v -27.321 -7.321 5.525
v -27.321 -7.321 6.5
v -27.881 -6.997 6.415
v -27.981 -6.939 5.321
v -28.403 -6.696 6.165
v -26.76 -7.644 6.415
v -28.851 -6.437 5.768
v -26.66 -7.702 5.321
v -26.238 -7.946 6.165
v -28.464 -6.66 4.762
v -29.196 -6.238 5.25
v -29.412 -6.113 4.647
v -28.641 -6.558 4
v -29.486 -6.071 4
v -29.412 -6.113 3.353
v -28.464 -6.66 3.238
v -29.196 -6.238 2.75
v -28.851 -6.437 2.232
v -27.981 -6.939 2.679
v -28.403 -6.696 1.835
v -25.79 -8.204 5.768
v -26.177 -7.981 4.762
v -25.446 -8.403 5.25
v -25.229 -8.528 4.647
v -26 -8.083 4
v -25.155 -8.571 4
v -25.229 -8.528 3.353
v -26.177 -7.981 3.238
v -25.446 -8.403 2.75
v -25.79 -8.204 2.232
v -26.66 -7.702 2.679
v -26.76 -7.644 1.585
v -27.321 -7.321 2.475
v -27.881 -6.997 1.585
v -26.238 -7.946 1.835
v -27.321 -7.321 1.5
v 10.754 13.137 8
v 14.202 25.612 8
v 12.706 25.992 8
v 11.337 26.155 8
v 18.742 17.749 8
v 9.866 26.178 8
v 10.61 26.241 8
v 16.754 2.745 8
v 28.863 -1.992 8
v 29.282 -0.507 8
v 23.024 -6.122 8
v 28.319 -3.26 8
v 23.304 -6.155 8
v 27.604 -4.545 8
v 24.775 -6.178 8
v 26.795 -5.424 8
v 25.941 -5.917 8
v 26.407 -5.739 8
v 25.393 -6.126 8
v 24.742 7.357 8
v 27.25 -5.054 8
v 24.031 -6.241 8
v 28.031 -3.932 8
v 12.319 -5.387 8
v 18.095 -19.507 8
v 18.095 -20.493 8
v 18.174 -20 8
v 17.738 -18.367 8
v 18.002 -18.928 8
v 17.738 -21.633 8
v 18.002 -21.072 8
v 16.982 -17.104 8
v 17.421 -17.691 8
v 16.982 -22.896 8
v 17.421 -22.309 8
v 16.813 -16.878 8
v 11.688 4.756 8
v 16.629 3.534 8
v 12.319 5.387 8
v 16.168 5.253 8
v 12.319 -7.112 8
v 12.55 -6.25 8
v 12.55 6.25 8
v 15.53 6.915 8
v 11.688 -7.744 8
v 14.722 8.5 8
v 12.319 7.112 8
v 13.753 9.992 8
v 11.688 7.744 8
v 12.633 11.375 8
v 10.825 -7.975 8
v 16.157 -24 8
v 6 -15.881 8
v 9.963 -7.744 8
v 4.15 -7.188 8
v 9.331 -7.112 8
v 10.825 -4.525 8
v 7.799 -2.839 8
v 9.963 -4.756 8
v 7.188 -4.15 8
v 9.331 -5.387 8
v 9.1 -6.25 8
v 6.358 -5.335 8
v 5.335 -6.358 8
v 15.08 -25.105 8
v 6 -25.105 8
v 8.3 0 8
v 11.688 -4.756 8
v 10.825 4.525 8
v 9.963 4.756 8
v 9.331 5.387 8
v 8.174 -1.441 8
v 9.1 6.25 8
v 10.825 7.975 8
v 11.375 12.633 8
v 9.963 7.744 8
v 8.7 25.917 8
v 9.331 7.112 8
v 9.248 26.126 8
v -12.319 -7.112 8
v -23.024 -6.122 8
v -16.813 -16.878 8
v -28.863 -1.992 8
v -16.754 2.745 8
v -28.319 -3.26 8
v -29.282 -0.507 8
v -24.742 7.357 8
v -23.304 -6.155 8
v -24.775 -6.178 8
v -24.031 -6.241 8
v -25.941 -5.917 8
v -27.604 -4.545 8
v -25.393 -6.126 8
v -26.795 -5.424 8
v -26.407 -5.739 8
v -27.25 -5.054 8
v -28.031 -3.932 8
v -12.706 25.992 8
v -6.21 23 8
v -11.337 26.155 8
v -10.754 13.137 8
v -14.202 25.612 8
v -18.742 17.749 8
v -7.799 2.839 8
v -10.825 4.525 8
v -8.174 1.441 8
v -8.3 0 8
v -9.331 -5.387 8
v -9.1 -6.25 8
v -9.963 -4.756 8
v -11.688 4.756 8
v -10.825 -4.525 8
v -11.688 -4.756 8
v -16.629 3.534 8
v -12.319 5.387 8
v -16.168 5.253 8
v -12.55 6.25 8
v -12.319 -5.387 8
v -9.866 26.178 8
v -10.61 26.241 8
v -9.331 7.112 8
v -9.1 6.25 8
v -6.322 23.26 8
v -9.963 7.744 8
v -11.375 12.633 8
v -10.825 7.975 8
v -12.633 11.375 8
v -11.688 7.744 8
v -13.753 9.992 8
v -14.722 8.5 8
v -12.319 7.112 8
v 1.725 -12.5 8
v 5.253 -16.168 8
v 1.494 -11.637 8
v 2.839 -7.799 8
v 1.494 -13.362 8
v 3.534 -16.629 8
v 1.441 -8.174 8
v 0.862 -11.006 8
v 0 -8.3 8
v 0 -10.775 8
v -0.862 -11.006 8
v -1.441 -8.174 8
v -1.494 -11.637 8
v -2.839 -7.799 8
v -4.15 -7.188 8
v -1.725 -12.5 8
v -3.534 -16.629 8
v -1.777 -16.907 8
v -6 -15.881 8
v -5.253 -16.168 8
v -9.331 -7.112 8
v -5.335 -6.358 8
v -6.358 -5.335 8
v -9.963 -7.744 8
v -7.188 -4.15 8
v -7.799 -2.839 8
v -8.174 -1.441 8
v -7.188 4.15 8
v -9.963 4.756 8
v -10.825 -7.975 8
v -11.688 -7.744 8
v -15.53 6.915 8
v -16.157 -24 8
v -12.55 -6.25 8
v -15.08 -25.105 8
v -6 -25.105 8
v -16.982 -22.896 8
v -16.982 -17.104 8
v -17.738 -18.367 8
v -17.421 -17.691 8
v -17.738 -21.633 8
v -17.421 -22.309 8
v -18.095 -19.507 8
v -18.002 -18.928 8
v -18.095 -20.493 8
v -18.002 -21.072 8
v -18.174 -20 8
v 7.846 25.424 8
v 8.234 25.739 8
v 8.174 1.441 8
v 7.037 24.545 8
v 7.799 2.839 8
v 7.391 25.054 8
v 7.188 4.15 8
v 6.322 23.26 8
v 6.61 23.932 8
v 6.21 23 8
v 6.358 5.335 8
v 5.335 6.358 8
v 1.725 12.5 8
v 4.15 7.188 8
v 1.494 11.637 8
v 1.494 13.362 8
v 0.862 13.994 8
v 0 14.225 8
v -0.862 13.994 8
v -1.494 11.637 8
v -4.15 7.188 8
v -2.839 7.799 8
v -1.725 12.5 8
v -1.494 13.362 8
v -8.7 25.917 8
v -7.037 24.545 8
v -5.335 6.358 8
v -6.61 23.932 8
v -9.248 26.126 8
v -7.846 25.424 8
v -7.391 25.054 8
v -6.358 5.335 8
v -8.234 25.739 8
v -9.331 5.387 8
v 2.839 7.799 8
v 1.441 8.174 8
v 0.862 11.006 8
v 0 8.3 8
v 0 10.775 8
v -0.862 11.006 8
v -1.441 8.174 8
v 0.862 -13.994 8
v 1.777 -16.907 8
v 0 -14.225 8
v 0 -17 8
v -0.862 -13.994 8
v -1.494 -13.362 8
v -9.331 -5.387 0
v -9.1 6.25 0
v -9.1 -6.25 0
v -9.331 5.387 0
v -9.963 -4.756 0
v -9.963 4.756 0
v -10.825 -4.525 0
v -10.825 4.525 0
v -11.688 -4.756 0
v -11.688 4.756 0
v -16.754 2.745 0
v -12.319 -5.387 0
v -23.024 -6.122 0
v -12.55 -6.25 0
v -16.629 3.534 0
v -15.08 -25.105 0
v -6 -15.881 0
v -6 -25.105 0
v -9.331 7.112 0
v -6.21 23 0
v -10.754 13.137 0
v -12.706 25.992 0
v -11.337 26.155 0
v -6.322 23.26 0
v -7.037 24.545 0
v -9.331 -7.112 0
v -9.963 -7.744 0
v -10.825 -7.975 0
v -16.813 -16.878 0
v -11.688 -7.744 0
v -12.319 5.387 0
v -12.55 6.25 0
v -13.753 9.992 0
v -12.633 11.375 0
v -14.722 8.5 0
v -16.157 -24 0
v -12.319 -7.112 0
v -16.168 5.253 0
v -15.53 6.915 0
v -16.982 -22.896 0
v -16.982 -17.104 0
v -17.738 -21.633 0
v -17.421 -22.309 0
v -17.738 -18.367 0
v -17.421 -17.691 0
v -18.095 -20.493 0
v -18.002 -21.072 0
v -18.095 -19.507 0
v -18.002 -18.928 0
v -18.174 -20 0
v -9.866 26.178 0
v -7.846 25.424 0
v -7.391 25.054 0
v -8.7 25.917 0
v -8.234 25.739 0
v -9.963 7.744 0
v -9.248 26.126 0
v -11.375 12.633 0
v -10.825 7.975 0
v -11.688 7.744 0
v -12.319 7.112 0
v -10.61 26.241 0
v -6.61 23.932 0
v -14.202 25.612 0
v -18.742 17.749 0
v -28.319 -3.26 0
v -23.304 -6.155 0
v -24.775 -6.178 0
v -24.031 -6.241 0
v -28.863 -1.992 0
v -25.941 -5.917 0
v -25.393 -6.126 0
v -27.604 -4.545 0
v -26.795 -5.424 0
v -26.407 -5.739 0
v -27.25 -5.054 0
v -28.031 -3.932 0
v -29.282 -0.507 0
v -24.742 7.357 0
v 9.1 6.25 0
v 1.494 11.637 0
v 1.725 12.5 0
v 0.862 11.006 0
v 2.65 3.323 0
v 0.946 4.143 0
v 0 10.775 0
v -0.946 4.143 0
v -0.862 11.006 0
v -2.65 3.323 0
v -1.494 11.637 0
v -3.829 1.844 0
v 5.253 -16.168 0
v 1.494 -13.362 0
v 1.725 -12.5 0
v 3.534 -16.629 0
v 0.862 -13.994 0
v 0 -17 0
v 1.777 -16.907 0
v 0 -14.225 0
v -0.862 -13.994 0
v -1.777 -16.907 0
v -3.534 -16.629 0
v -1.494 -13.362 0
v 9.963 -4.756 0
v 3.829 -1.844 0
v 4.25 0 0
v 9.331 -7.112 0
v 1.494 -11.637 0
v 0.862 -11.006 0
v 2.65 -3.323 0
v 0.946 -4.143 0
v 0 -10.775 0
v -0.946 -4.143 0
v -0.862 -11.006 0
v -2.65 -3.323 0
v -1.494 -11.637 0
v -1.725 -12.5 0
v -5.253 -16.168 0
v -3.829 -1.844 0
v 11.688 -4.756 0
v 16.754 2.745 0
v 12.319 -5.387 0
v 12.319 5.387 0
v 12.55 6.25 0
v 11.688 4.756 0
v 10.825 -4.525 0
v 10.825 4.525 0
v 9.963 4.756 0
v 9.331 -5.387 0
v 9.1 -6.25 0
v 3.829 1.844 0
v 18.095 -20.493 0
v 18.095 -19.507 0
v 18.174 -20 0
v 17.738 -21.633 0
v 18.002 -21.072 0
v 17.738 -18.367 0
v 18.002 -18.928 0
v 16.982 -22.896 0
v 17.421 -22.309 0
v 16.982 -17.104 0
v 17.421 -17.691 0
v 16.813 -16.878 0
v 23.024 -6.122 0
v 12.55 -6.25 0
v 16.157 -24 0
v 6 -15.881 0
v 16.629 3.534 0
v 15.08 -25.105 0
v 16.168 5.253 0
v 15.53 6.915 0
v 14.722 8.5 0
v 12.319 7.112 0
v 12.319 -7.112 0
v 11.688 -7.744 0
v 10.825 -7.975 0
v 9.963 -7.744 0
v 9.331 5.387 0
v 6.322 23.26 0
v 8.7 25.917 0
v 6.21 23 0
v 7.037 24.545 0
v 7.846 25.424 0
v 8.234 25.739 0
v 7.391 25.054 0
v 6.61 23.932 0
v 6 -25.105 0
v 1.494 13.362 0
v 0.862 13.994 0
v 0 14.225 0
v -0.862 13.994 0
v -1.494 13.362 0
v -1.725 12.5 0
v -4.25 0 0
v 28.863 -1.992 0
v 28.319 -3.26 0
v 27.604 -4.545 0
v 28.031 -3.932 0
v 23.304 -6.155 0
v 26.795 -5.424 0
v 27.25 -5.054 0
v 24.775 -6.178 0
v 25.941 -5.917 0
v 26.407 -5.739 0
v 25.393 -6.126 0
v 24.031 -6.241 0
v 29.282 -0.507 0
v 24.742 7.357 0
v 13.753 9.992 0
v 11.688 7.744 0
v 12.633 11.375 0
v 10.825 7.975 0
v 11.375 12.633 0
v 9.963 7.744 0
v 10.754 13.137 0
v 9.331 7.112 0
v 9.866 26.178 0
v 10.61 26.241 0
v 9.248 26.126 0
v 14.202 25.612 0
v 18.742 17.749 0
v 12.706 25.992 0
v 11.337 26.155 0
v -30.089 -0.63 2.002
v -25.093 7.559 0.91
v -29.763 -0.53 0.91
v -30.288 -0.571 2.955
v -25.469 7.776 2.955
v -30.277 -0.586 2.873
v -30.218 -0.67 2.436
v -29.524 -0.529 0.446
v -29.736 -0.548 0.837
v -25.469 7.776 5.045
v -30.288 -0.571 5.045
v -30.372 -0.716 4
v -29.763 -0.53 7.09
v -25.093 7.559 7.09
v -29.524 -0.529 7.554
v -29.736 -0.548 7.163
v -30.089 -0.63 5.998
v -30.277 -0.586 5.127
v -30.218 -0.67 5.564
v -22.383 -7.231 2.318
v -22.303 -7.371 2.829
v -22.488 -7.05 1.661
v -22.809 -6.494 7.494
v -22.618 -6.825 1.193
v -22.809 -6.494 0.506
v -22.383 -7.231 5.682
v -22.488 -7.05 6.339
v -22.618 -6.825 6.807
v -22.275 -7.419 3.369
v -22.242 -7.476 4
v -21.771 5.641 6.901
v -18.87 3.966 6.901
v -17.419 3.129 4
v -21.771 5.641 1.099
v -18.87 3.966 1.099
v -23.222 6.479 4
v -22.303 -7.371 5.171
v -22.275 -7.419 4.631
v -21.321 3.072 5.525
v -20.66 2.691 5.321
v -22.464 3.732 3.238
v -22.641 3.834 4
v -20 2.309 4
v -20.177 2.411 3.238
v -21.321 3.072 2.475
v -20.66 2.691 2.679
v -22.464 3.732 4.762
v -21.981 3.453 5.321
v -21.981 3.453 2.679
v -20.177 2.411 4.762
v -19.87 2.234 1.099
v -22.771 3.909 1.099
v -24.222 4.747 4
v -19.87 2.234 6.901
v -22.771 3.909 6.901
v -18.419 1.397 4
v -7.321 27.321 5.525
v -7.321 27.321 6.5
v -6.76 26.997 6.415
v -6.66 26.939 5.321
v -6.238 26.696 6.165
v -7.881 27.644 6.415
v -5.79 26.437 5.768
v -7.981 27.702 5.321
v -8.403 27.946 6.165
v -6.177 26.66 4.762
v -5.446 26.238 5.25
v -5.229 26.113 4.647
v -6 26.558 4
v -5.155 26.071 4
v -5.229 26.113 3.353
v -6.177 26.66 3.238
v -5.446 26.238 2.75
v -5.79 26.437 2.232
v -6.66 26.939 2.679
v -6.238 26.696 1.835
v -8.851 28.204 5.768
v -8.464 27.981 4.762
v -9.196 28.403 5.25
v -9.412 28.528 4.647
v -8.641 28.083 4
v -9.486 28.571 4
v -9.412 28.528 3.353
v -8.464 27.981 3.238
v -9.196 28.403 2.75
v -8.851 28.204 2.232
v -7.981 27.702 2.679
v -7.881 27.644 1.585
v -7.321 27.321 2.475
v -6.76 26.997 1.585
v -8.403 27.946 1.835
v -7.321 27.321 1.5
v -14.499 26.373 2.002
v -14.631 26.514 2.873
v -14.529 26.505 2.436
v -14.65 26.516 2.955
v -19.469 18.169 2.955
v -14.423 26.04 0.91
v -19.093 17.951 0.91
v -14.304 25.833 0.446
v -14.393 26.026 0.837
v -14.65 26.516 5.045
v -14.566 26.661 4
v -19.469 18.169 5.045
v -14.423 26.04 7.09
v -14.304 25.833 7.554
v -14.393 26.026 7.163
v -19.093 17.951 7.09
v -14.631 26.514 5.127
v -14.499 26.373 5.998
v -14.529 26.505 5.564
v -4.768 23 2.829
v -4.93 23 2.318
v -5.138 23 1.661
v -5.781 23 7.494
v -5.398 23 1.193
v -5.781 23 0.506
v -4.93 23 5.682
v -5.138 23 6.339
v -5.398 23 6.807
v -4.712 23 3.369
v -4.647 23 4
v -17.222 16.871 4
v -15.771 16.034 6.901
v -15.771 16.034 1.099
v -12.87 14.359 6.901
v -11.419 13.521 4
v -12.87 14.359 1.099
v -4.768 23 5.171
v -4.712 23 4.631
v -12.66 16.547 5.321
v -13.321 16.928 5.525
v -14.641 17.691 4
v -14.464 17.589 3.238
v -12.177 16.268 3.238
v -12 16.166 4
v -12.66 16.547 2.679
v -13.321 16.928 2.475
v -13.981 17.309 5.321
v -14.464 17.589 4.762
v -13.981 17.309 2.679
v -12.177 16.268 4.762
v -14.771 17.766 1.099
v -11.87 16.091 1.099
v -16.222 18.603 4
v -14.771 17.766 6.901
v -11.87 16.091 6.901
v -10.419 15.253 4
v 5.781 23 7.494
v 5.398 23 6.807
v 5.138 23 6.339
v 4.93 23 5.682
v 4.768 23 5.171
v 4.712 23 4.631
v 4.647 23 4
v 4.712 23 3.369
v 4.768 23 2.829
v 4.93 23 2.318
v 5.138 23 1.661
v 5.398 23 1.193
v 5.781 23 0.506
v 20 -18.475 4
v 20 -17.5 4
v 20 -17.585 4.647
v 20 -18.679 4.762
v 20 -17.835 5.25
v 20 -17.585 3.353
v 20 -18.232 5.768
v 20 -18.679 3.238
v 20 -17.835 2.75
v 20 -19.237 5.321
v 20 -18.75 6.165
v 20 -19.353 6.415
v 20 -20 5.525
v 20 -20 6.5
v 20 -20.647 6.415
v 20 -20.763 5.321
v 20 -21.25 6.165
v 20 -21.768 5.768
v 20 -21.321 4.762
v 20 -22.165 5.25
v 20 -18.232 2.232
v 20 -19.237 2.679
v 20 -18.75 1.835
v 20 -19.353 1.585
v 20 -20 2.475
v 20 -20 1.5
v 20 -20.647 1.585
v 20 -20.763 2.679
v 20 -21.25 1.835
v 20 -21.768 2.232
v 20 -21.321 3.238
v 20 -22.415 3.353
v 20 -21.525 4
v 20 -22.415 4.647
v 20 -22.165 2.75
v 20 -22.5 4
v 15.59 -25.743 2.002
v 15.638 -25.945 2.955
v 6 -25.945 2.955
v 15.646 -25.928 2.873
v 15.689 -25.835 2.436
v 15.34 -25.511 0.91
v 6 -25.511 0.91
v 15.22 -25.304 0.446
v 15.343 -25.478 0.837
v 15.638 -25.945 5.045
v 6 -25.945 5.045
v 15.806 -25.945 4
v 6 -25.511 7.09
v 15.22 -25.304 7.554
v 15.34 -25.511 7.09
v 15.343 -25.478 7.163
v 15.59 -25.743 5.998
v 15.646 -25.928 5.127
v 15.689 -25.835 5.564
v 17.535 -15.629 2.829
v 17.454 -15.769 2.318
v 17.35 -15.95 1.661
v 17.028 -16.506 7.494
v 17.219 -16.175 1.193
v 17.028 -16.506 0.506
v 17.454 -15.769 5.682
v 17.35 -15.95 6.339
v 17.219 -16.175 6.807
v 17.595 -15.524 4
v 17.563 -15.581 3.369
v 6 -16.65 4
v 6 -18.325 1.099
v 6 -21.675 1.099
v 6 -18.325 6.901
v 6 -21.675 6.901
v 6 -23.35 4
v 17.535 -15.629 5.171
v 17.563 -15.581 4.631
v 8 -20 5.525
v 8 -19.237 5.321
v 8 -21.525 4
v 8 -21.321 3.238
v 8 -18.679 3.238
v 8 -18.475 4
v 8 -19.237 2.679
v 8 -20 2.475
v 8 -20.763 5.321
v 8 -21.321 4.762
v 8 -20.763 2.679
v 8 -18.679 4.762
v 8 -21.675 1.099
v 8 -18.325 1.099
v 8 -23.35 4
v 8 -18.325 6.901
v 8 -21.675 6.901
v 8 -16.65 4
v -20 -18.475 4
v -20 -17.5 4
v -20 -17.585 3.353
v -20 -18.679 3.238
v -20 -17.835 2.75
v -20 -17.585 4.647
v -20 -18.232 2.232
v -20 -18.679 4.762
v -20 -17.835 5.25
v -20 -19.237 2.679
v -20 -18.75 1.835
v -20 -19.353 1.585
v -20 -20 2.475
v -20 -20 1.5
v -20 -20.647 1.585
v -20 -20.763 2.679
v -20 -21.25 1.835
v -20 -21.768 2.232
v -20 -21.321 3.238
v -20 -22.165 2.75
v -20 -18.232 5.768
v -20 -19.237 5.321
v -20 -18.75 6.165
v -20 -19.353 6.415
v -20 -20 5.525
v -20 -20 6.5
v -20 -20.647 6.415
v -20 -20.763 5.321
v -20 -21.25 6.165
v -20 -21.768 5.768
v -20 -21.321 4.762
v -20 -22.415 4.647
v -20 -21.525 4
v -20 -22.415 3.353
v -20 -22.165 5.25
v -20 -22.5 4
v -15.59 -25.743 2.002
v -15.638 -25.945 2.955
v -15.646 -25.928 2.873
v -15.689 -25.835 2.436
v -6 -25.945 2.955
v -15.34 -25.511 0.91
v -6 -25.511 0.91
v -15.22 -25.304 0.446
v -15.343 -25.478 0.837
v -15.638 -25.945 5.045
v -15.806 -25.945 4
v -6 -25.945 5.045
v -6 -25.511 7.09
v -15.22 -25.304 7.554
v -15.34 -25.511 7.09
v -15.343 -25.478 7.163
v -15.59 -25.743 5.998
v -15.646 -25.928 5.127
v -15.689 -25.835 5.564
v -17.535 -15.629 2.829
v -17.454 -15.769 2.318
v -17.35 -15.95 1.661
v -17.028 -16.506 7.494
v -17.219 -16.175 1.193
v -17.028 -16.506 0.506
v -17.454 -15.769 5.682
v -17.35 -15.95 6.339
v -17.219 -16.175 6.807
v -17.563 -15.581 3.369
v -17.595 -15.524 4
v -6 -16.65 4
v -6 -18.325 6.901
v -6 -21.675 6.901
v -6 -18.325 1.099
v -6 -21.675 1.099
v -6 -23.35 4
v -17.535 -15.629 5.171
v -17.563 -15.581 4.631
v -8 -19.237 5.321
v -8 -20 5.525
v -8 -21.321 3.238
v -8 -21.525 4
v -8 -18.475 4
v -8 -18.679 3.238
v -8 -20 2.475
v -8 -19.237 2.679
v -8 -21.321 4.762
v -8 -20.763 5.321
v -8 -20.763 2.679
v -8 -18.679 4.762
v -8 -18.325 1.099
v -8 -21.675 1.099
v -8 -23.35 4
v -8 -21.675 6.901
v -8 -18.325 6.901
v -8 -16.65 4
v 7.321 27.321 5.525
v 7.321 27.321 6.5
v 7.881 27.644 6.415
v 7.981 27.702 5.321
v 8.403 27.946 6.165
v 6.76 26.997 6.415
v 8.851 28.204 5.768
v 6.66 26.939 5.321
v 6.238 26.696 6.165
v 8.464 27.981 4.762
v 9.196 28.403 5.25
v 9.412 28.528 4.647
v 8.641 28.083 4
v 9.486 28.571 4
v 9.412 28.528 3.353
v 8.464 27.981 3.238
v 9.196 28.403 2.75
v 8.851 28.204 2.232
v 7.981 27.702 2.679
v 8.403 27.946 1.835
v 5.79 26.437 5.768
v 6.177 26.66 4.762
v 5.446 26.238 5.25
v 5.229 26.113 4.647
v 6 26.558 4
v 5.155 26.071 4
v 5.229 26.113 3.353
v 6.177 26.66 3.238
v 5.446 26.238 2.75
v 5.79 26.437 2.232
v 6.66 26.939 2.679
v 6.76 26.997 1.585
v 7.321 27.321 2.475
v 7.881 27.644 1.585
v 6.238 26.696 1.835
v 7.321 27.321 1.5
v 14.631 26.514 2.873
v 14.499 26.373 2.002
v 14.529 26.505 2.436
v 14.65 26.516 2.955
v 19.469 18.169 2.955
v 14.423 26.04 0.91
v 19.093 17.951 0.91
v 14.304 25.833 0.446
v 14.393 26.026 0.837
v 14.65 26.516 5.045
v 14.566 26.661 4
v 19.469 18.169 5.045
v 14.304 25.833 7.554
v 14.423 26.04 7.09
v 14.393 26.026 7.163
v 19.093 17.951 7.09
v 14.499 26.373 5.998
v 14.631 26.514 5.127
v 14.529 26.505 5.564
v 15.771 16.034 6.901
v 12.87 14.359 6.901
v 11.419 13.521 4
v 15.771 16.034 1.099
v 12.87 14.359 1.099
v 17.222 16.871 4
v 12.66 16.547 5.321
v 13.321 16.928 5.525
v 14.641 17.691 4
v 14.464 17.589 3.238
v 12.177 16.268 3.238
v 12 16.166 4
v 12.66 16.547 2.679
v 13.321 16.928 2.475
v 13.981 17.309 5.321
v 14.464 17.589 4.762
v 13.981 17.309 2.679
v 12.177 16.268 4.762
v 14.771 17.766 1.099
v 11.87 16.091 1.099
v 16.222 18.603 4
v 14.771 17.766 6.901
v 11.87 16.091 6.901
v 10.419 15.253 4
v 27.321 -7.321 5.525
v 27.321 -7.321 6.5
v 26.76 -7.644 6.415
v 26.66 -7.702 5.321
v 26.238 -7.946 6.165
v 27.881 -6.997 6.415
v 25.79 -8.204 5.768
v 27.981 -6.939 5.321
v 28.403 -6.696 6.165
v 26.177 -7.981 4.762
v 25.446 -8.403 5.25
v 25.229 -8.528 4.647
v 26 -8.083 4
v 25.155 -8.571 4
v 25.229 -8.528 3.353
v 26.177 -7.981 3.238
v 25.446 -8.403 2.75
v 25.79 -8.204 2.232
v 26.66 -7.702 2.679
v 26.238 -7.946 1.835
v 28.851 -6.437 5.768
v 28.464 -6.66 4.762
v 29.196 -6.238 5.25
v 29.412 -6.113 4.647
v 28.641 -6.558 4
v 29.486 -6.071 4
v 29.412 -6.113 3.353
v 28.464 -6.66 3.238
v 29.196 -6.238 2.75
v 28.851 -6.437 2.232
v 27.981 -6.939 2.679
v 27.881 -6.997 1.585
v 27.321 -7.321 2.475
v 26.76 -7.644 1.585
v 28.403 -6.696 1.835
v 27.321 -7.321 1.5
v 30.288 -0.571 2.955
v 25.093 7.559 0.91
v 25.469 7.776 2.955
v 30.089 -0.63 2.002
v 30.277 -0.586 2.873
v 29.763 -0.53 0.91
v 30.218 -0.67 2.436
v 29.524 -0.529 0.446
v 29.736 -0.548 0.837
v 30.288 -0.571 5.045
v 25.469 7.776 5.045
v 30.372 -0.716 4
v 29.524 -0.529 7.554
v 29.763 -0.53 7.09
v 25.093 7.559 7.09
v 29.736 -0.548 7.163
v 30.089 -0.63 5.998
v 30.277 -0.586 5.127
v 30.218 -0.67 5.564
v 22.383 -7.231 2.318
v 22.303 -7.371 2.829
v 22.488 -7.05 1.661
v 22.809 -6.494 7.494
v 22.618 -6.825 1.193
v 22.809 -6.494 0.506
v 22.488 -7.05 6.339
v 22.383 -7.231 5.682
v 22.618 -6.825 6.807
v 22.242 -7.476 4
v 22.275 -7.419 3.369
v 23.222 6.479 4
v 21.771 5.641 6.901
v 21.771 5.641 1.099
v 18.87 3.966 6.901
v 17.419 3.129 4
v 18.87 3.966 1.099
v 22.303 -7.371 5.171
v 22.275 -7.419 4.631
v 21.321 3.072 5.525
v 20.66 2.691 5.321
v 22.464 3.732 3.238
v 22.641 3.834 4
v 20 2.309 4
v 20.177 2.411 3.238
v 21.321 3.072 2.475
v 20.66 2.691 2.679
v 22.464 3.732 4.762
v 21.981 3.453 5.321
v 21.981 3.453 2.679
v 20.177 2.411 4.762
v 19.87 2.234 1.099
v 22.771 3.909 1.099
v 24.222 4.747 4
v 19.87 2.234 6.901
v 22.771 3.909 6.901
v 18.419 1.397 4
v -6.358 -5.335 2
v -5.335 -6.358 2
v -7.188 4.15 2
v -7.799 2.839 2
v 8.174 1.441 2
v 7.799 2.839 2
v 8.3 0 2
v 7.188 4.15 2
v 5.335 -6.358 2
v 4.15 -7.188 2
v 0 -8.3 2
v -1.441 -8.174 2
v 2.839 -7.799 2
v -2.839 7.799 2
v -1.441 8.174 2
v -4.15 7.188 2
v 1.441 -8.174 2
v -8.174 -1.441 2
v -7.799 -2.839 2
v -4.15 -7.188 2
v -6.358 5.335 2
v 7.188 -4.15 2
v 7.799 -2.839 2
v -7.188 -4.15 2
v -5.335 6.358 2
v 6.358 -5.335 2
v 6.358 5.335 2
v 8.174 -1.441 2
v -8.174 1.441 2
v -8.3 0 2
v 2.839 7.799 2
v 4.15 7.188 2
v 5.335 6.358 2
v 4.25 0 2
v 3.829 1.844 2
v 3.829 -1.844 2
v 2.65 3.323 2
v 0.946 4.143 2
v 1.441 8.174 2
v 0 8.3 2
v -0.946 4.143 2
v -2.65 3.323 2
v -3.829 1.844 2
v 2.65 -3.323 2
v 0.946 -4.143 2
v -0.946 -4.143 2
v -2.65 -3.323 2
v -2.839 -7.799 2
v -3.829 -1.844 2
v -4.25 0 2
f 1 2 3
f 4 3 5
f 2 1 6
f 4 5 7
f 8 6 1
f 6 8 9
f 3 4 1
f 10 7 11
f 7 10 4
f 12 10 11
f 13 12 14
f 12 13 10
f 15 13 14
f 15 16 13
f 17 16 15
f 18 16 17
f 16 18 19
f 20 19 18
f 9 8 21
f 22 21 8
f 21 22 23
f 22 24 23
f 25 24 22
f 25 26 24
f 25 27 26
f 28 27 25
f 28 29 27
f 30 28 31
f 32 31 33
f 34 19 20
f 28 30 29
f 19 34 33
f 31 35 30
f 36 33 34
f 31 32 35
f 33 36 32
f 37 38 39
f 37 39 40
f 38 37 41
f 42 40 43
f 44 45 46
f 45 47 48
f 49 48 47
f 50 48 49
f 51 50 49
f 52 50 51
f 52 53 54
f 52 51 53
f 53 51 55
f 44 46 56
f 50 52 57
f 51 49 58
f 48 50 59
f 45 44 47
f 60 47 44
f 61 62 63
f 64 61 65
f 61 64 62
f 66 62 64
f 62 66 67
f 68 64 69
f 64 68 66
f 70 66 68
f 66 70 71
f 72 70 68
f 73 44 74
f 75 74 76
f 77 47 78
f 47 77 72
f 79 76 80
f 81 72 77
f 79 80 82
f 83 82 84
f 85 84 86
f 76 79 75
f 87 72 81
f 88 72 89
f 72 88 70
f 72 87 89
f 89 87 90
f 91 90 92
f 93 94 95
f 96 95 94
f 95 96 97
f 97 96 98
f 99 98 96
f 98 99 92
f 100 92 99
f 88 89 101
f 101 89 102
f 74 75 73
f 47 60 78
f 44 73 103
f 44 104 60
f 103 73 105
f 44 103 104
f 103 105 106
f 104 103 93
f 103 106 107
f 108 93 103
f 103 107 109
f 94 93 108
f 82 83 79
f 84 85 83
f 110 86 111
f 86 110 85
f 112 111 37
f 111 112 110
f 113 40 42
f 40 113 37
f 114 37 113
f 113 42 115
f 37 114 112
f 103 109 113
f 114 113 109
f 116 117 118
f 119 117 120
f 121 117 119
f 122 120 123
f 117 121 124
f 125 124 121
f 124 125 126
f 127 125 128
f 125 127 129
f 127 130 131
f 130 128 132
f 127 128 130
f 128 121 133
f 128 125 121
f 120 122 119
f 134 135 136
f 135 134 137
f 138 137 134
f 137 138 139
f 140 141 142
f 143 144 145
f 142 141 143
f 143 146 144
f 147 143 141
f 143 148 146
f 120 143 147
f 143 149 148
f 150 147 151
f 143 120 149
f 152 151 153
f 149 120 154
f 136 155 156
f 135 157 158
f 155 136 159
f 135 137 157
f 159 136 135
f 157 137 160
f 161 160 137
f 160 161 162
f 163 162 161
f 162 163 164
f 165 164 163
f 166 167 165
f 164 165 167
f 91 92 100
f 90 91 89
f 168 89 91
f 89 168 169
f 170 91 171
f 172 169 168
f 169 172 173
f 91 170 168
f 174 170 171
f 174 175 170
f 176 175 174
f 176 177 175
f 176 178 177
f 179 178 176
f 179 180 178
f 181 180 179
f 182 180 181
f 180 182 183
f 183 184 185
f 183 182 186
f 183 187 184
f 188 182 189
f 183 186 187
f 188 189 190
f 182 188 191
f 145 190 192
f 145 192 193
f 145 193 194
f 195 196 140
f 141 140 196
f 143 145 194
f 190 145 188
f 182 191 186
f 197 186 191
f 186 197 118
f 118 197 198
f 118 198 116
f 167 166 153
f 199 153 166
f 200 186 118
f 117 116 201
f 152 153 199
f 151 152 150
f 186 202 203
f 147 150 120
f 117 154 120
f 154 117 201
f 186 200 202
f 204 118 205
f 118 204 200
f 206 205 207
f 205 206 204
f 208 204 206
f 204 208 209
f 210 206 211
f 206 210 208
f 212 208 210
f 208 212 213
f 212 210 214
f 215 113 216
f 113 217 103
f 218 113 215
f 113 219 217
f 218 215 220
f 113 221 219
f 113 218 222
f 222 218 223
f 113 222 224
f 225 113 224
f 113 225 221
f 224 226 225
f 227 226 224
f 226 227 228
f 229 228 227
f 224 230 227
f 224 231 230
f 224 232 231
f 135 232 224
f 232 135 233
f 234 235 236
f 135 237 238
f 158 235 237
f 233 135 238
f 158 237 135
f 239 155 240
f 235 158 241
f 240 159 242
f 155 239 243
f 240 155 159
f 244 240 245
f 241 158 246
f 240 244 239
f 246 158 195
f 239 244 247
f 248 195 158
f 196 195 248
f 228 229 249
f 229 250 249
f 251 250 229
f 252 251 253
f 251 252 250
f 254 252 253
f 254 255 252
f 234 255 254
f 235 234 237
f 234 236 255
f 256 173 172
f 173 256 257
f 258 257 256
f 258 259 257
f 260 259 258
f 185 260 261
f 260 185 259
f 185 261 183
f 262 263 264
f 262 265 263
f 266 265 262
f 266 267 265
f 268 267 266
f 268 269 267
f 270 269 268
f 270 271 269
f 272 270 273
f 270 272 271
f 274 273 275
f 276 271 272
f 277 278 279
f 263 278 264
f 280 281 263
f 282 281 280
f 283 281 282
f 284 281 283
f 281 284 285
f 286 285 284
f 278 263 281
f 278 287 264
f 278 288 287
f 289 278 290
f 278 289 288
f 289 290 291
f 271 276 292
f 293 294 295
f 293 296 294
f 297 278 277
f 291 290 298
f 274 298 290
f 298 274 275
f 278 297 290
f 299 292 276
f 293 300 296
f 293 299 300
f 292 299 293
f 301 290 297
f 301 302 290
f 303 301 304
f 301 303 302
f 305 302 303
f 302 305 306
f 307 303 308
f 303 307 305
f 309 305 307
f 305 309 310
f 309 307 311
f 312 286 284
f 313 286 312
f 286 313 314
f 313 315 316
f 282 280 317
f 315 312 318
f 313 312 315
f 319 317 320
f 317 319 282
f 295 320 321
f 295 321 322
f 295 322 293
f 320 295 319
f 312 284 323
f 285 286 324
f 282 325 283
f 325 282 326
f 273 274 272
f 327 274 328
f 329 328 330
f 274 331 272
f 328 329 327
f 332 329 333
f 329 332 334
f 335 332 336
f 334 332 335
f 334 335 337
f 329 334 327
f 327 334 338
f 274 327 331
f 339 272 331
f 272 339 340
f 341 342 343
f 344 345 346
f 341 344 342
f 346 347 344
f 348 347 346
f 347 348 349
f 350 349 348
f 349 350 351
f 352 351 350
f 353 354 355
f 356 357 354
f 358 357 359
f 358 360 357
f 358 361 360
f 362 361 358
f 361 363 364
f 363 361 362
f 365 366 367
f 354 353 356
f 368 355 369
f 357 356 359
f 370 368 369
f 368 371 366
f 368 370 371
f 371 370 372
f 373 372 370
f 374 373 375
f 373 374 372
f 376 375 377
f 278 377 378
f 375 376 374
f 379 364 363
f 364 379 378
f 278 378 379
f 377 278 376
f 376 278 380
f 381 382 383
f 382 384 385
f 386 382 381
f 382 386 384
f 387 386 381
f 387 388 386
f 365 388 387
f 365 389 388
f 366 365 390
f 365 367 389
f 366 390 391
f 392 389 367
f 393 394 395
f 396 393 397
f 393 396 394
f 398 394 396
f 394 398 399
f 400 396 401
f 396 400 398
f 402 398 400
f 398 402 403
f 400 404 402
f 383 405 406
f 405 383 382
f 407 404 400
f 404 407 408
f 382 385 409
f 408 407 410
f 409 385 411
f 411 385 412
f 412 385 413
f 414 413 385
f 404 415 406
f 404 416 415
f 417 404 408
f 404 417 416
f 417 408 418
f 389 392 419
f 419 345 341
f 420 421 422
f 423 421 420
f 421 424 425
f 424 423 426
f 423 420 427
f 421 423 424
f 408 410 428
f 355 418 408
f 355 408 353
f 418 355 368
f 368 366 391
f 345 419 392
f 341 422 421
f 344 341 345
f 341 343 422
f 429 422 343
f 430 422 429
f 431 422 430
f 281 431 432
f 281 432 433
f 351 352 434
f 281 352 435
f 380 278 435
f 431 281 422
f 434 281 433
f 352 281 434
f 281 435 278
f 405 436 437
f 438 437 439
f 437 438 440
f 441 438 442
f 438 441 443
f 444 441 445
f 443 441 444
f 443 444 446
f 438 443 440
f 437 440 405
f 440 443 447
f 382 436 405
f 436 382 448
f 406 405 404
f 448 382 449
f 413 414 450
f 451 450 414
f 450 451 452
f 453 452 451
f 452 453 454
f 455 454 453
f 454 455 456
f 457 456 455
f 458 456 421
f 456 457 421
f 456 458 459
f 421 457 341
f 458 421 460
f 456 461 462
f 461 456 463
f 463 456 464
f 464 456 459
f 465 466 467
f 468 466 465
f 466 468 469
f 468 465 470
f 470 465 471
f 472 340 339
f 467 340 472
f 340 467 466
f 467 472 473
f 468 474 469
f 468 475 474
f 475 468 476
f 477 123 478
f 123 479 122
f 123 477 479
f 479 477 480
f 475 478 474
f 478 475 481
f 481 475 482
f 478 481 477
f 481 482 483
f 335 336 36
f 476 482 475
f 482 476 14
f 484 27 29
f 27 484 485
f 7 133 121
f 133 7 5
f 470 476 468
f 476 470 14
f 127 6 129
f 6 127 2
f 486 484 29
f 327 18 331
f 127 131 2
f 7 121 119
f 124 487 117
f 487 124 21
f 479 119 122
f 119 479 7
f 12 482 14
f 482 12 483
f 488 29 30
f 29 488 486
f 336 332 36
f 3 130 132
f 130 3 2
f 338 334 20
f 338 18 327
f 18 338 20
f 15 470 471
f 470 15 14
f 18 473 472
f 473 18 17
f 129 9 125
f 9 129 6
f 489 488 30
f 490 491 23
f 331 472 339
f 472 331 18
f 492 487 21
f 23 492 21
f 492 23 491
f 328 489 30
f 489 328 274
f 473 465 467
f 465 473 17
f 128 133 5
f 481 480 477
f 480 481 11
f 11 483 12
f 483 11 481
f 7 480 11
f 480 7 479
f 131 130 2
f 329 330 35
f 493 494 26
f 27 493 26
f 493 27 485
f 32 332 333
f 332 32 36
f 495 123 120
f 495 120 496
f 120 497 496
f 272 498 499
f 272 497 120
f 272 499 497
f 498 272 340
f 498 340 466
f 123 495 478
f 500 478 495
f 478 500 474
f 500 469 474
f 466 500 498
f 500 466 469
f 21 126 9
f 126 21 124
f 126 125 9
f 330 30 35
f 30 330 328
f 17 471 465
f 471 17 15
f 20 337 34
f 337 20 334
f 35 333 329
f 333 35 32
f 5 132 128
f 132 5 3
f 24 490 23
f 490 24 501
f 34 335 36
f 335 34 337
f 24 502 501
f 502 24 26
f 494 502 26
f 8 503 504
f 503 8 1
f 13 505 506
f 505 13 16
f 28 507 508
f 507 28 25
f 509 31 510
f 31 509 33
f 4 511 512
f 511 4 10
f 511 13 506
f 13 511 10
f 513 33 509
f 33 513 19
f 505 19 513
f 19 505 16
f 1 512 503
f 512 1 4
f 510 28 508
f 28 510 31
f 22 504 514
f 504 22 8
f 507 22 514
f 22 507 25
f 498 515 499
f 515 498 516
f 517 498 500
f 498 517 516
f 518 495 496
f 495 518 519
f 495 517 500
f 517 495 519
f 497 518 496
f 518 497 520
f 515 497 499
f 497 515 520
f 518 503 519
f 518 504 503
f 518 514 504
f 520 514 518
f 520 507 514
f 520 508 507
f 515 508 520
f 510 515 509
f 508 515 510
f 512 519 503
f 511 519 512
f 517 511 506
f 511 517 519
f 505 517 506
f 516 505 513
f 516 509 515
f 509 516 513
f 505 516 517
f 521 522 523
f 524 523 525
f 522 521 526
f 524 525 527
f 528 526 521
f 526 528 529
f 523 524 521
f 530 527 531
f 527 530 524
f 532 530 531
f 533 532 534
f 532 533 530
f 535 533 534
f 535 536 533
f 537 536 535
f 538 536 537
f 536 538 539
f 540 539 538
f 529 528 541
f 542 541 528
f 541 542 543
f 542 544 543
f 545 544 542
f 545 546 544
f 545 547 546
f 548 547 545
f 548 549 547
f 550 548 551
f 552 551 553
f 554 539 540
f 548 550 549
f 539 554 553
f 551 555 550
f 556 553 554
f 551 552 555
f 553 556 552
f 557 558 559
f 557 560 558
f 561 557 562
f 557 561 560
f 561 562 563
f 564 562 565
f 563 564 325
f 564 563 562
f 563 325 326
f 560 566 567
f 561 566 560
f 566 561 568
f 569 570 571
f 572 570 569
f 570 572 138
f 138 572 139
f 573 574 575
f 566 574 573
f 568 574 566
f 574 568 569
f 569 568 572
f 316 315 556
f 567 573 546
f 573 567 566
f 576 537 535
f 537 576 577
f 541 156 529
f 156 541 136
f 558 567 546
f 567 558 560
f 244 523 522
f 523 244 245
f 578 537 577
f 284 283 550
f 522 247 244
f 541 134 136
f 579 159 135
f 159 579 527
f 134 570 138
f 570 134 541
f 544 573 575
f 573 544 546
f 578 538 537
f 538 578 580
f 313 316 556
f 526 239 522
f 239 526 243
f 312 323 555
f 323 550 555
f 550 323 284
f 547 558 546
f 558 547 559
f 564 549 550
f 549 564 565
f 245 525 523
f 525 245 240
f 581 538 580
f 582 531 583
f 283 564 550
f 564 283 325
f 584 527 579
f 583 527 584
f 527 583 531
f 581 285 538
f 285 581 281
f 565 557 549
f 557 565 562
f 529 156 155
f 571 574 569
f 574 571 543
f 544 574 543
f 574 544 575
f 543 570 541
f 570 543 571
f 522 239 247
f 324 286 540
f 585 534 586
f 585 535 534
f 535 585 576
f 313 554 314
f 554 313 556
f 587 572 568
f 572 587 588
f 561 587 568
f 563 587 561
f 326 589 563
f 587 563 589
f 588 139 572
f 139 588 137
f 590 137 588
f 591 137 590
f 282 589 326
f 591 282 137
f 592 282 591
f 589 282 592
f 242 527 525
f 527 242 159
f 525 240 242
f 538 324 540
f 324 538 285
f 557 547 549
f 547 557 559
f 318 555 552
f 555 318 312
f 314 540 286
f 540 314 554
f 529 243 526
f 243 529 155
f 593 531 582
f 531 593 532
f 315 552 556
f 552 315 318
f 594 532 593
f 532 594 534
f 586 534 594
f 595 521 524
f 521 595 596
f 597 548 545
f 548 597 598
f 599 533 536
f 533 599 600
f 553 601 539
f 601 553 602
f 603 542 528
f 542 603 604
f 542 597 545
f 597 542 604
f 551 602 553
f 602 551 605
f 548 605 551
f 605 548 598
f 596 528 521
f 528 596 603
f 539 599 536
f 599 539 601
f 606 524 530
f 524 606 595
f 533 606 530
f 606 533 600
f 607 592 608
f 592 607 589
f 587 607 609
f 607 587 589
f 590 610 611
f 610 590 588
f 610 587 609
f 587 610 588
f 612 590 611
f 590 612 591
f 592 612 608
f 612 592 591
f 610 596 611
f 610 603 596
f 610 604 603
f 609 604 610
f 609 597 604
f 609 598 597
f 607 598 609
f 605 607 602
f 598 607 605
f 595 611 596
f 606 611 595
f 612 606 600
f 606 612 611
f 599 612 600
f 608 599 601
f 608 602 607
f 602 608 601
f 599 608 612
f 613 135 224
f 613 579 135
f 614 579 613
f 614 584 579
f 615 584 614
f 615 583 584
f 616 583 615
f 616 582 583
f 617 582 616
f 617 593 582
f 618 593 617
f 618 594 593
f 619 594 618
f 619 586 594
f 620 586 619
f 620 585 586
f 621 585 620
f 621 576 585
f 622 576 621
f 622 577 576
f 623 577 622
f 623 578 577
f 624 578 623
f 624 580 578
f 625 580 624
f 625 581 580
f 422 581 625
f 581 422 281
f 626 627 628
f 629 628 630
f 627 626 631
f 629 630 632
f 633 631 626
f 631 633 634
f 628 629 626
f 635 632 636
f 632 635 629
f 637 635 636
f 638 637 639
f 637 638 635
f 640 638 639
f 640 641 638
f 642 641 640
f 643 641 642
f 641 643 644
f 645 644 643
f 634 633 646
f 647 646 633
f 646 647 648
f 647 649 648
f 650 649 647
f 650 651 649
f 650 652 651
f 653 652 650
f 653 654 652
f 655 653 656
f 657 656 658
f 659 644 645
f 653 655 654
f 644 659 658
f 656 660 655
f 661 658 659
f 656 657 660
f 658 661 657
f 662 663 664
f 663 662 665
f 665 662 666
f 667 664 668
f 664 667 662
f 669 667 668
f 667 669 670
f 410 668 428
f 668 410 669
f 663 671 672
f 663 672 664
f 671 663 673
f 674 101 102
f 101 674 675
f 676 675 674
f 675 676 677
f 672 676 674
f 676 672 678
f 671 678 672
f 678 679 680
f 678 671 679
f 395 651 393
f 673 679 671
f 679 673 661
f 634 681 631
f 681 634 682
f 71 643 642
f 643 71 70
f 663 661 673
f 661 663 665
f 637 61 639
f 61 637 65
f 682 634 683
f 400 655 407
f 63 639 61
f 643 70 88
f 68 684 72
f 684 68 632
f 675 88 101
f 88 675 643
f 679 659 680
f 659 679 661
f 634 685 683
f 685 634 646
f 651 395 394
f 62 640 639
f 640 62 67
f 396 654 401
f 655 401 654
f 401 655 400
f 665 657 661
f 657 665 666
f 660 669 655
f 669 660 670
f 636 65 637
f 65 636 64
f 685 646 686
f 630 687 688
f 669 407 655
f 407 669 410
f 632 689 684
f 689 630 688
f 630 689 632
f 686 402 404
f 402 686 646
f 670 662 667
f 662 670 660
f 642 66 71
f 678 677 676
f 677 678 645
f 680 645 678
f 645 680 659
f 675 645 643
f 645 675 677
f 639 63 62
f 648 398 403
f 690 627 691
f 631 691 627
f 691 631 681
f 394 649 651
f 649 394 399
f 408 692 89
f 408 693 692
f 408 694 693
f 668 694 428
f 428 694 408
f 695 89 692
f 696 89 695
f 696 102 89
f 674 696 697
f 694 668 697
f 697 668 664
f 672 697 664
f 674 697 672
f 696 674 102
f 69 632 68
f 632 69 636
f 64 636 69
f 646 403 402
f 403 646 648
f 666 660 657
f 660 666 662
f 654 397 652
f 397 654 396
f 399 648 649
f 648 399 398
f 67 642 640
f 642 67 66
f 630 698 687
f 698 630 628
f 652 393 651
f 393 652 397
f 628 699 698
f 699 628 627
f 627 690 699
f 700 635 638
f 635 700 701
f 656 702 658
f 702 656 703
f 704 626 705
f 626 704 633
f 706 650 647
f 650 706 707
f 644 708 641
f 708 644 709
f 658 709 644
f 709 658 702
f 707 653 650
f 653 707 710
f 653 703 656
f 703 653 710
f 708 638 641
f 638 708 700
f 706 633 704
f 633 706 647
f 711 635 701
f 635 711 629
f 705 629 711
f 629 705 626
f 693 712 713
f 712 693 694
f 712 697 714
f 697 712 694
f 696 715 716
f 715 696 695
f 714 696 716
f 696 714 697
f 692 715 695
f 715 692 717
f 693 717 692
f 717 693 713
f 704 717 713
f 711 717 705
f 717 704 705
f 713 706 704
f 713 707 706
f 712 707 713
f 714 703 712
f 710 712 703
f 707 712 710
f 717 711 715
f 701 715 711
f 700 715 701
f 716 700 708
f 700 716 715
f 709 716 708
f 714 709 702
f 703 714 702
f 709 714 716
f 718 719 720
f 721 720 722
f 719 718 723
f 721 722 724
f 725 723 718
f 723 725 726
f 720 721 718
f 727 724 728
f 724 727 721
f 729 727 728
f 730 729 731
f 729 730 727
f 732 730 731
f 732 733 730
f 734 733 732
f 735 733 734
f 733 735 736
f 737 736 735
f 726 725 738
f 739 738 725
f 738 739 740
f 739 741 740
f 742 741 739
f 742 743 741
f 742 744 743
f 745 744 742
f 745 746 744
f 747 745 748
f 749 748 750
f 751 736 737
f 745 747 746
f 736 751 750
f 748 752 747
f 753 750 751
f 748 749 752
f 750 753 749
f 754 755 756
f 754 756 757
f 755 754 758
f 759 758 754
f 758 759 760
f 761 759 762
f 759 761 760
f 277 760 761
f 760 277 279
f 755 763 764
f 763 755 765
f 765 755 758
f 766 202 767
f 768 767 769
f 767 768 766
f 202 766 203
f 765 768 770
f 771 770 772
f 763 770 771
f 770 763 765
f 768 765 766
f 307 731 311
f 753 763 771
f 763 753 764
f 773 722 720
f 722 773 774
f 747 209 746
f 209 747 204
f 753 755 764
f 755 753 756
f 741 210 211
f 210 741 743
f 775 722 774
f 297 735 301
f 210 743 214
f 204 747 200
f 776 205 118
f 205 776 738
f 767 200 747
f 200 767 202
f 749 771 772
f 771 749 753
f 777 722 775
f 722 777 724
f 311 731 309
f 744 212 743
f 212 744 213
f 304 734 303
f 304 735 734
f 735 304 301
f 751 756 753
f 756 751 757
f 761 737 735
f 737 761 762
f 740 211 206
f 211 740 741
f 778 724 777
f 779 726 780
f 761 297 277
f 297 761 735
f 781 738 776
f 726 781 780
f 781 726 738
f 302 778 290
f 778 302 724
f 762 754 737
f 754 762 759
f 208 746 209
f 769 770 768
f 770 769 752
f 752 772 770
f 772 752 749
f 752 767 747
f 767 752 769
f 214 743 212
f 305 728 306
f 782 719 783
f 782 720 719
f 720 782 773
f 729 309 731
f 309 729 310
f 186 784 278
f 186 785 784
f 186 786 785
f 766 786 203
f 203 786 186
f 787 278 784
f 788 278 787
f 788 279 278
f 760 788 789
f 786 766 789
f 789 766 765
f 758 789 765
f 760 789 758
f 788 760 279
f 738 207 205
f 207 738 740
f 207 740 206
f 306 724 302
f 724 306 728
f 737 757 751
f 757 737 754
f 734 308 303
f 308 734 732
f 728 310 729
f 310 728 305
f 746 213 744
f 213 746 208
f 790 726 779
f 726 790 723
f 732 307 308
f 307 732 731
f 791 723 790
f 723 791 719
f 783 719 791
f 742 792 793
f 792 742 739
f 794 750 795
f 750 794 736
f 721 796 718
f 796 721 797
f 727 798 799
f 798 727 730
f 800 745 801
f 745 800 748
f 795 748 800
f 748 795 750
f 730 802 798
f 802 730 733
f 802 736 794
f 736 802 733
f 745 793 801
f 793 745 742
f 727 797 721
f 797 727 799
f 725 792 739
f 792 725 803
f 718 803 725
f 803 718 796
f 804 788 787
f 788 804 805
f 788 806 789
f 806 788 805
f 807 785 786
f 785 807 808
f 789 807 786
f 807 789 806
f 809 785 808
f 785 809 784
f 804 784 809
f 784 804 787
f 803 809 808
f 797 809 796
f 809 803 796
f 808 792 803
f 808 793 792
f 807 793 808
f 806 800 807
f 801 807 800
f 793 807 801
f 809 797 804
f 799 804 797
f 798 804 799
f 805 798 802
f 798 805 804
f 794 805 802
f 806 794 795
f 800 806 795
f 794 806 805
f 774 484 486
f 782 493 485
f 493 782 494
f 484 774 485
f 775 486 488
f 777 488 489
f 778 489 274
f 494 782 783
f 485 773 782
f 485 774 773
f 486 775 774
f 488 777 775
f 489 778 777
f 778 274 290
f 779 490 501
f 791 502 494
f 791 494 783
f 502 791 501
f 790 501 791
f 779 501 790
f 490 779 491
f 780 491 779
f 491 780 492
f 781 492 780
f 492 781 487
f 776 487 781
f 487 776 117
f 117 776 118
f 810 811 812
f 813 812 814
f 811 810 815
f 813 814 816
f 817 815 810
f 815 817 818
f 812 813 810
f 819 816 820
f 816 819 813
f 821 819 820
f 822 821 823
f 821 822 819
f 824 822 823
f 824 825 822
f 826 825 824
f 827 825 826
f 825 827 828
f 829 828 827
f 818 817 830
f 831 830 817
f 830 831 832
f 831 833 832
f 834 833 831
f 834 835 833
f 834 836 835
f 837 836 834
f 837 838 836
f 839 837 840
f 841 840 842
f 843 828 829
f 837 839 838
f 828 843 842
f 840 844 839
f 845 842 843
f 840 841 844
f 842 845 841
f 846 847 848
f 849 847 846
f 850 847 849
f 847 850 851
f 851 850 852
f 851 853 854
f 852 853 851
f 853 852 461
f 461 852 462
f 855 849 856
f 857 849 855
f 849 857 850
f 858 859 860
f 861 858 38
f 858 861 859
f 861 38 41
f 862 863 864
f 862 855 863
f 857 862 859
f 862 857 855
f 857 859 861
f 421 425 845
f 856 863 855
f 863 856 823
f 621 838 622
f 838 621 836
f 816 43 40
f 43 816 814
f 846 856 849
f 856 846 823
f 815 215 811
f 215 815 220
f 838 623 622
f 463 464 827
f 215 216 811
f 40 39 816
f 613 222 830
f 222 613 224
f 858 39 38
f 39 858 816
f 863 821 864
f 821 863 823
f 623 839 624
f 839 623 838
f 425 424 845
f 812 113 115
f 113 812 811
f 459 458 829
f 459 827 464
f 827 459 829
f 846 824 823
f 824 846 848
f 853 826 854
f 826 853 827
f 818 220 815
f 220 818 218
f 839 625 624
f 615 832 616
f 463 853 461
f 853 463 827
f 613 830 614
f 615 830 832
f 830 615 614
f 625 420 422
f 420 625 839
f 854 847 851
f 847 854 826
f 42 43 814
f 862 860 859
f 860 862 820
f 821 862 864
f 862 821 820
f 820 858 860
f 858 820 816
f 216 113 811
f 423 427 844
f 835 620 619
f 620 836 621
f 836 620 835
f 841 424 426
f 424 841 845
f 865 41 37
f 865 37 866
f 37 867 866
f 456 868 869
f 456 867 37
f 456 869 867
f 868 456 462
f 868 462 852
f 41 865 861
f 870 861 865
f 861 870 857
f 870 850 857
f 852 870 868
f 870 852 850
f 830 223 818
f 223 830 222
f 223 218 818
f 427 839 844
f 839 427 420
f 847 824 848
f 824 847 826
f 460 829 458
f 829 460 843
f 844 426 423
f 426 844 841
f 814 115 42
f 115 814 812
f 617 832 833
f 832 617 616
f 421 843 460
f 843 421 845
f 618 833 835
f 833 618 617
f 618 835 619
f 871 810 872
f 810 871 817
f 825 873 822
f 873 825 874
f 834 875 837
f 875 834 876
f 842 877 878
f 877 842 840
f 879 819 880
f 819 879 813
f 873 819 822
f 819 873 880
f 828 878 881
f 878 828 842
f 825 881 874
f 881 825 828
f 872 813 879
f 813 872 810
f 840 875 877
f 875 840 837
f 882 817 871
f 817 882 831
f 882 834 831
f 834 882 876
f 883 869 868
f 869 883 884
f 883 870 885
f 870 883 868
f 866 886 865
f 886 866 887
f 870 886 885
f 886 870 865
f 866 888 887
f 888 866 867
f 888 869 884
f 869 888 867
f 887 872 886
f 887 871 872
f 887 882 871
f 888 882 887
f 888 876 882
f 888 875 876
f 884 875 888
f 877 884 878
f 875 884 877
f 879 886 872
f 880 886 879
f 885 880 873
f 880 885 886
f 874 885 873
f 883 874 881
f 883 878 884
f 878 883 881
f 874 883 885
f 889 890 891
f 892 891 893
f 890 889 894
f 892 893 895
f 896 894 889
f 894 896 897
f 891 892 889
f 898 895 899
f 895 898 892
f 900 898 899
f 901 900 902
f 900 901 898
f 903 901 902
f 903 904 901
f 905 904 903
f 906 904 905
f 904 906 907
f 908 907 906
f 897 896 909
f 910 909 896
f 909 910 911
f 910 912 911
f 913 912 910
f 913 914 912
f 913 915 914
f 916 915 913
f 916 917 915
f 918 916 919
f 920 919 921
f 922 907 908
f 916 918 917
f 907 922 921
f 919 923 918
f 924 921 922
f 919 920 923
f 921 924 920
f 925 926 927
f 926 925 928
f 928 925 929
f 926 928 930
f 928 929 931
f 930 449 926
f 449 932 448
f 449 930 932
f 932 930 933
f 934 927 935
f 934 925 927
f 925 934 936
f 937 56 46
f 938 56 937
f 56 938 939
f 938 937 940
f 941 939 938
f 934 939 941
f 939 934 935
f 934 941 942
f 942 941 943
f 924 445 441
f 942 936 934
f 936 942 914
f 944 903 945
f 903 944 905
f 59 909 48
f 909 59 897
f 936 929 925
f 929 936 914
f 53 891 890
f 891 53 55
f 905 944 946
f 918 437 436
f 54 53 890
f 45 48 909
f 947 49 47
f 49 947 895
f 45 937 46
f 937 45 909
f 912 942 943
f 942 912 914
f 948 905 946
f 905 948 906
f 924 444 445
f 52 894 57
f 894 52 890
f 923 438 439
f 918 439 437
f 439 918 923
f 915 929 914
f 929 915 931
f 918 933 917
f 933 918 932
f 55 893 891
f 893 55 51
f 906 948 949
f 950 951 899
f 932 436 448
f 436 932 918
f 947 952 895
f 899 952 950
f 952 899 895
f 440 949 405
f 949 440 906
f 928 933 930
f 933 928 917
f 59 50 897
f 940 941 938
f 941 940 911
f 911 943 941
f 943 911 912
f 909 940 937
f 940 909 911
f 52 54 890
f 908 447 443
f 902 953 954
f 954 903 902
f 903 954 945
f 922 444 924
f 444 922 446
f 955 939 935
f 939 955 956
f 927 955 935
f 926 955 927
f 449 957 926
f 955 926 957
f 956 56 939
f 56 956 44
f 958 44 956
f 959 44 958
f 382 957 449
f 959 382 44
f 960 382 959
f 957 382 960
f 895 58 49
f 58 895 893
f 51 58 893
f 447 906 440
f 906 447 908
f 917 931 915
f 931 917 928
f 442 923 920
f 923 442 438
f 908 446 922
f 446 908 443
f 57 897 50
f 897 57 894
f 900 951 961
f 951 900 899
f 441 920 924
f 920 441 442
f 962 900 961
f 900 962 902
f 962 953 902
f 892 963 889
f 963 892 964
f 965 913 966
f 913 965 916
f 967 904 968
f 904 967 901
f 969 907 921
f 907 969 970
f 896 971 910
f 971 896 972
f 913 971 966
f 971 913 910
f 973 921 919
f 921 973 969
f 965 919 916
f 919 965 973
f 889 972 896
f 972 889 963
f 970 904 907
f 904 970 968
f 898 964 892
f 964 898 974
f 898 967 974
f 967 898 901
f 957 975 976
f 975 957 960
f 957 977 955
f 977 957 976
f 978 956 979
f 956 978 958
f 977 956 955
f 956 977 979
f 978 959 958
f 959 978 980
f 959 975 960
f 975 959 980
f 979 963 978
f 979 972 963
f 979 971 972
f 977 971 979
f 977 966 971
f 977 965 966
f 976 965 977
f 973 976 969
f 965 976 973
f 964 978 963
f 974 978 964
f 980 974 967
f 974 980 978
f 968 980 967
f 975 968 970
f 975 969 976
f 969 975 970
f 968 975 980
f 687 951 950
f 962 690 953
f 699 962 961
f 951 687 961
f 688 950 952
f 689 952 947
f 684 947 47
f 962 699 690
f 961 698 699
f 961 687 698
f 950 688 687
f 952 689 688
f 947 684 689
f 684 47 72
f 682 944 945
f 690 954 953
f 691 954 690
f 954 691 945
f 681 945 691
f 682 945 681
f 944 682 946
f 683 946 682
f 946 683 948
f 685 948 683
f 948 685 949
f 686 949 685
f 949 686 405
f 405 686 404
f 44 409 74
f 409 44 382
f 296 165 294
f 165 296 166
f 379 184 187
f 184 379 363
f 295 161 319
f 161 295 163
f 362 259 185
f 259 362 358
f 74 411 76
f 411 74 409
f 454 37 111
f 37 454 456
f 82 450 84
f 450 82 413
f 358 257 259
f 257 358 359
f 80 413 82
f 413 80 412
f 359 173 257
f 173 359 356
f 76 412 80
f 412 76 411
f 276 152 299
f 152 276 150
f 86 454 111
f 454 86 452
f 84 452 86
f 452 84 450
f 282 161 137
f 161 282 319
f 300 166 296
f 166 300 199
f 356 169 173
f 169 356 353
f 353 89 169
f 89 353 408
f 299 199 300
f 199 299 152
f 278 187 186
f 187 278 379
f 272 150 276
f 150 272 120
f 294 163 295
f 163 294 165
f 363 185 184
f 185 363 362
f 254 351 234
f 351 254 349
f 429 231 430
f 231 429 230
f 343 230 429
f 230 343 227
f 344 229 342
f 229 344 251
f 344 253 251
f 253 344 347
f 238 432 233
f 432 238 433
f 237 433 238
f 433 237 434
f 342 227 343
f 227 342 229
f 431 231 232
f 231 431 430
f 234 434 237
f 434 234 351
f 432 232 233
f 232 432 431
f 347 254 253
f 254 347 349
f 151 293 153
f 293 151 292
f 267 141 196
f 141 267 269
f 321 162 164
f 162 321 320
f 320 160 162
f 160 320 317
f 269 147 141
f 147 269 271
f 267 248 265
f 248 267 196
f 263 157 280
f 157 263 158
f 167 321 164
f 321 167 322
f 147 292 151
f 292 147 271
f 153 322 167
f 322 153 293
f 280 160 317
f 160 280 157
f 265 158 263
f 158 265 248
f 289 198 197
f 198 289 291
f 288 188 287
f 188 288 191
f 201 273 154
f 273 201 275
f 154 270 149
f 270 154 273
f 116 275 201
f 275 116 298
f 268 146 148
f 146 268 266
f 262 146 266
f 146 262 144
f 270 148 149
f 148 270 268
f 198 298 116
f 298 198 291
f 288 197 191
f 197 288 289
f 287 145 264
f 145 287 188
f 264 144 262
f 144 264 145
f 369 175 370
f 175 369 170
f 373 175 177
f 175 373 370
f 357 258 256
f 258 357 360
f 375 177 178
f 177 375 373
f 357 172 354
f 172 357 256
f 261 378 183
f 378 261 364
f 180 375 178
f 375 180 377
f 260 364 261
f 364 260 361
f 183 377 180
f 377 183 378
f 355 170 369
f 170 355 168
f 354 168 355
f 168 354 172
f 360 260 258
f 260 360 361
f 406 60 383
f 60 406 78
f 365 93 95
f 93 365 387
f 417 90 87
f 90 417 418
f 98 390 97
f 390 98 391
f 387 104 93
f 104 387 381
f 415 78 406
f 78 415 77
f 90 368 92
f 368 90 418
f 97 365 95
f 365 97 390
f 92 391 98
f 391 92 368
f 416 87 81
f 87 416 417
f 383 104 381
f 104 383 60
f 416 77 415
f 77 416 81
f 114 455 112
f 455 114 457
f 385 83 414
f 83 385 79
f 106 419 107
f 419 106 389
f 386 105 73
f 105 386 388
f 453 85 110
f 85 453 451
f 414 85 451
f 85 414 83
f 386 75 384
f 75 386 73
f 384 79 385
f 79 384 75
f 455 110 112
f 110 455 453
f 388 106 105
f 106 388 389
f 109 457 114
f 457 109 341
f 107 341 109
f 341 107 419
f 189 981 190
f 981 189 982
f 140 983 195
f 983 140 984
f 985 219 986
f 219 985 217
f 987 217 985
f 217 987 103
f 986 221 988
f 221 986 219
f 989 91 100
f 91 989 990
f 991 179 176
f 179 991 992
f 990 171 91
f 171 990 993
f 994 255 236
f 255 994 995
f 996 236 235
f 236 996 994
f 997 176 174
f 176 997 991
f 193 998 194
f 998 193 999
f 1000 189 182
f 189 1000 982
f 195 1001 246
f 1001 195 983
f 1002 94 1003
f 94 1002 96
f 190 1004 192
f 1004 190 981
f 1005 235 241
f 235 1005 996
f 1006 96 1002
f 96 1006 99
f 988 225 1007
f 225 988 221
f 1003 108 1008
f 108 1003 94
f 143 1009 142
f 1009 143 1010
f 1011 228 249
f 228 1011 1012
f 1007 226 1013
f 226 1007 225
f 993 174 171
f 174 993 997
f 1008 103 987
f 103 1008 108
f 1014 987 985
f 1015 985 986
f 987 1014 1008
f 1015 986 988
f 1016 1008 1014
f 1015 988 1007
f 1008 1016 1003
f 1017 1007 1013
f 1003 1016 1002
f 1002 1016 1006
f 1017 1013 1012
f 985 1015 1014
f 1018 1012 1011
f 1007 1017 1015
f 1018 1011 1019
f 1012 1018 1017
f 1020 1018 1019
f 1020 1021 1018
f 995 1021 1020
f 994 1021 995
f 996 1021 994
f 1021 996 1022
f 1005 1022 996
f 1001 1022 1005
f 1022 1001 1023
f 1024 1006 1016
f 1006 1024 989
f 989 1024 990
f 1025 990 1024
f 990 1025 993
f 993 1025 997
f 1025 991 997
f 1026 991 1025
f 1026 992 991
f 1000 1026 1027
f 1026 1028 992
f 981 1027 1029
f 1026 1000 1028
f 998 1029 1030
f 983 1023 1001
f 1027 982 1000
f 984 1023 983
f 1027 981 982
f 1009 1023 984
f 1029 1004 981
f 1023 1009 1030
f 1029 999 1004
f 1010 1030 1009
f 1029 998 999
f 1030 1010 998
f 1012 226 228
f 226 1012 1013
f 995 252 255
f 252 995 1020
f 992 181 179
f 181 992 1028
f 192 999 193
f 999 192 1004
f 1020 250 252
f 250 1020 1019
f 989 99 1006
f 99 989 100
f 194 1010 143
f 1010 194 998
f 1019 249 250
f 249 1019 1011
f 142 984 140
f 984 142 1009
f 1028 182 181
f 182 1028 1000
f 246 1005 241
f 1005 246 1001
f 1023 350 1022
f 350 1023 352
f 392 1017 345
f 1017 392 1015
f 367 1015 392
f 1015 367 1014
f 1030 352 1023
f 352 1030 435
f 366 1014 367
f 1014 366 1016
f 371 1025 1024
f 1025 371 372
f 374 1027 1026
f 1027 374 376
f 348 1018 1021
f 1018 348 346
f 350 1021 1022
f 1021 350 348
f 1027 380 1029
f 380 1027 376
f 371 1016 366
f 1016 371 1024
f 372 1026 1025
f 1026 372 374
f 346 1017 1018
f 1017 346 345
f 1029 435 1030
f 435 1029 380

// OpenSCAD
// file: configuration.scad
// Increase this if your slicer or printer make holes too tight.
extra_radius = 0.1;

// OD = outside diameter, corner to corner.
m3_nut_od = 6.1;
m3_nut_radius = m3_nut_od/2 + 0.2 + extra_radius;
m3_washer_radius = 3.5 + extra_radius;

// Major diameter of metric 3mm thread.
m3_major = 2.85;
m3_radius = m3_major/2 + extra_radius;
m3_wide_radius = m3_major/2 + extra_radius + 0.2;

// NEMA17 stepper motors.
motor_shaft_diameter = 5;
motor_shaft_radius = motor_shaft_diameter/2 + extra_radius;

// Frame brackets. M3x8mm screws work best with 3.6 mm brackets.
thickness = 3.6;

// OpenBeam or Misumi. Currently only 15x15 mm, but there is a plan
// to make models more parametric and allow 20x20 mm in the future.
extrusion = 20;

extrusion_channel_w = 5; //use 3 for 1515
extrusion_channel_d = 3; //use 3 for 1515
extrusion_fin_d = 1;

vertex_radius = 40.5; //set to 36 for 1515
vertex_x_offset = 7.25; // offset of the horizontal extrusion to the vertical one in X axis
vertex_y_offset = 39 ;//27; // offset of the horizontal extrusion to the vertical one in Y axis

// Placement for the NEMA17 stepper motors.
motor_offset = 44;
motor_length = 47;
// main file
include <configuration.scad>;

separation = 40;  // Distance between ball joint mounting faces.
offset = 20;  // Same as DELTA_EFFECTOR_OFFSET in Marlin.
mount_radius = 12.5;  // Hotend mounting screws, standard would be 25mm.
hotend_radius = 8.3;  // Hole for the hotend (J-Head diameter is 16mm).
//change to 2mm for taobao
push_fit_height = 2;  // Length of brass threaded into printed plastic.
height = 8;
cone_r1 = 2.5;
cone_r2 = 14;

module effector() {
  difference() {
    union() {
      cylinder(r=offset-3, h=height, center=true, $fn=60);
      for (a = [60:120:359]) rotate([0, 0, a]) {
	rotate([0, 0, 30]) translate([offset-2, 0, 0])
	  cube([10, 13, height], center=true);
	for (s = [-1, 1]) scale([s, 1, 1]) {
	  translate([0, offset, 0]) difference() {
	    intersection() {
	      cube([separation, 40, height], center=true);
	      translate([0, -4, 0]) rotate([0, 90,  0])
		cylinder(r=10, h=separation, center=true);
	      translate([separation/2-7, 0, 0]) rotate([0, 90, 0])
		cylinder(r1=cone_r2, r2=cone_r1, h=14, center=true, $fn=24);
	    }
	    rotate([0, 90, 0])
	      cylinder(r=m3_radius, h=separation+1, center=true, $fn=12);
	    rotate([90, 0, 90])
	      cylinder(r=m3_nut_radius, h=separation-24, center=true, $fn=6);
	  }
        }
      }
    }
    translate([0, 0, push_fit_height-height/2])
      cylinder(r=hotend_radius, h=height, $fn=36);
    //change to m8 for e3d v6
    //translate([0, 0, -6]) # import("m6_internal.stl");
		translate([0, 0, -6]) 
			 cylinder(r=4.25, h=4);
    for (a = [0:60:359]) rotate([0, 0, a]) {
      translate([0, mount_radius, 0])
	cylinder(r=m3_wide_radius, h=2*height, center=true, $fn=12);
    }
  }
}

translate([0, 0, height/2]) effector();
